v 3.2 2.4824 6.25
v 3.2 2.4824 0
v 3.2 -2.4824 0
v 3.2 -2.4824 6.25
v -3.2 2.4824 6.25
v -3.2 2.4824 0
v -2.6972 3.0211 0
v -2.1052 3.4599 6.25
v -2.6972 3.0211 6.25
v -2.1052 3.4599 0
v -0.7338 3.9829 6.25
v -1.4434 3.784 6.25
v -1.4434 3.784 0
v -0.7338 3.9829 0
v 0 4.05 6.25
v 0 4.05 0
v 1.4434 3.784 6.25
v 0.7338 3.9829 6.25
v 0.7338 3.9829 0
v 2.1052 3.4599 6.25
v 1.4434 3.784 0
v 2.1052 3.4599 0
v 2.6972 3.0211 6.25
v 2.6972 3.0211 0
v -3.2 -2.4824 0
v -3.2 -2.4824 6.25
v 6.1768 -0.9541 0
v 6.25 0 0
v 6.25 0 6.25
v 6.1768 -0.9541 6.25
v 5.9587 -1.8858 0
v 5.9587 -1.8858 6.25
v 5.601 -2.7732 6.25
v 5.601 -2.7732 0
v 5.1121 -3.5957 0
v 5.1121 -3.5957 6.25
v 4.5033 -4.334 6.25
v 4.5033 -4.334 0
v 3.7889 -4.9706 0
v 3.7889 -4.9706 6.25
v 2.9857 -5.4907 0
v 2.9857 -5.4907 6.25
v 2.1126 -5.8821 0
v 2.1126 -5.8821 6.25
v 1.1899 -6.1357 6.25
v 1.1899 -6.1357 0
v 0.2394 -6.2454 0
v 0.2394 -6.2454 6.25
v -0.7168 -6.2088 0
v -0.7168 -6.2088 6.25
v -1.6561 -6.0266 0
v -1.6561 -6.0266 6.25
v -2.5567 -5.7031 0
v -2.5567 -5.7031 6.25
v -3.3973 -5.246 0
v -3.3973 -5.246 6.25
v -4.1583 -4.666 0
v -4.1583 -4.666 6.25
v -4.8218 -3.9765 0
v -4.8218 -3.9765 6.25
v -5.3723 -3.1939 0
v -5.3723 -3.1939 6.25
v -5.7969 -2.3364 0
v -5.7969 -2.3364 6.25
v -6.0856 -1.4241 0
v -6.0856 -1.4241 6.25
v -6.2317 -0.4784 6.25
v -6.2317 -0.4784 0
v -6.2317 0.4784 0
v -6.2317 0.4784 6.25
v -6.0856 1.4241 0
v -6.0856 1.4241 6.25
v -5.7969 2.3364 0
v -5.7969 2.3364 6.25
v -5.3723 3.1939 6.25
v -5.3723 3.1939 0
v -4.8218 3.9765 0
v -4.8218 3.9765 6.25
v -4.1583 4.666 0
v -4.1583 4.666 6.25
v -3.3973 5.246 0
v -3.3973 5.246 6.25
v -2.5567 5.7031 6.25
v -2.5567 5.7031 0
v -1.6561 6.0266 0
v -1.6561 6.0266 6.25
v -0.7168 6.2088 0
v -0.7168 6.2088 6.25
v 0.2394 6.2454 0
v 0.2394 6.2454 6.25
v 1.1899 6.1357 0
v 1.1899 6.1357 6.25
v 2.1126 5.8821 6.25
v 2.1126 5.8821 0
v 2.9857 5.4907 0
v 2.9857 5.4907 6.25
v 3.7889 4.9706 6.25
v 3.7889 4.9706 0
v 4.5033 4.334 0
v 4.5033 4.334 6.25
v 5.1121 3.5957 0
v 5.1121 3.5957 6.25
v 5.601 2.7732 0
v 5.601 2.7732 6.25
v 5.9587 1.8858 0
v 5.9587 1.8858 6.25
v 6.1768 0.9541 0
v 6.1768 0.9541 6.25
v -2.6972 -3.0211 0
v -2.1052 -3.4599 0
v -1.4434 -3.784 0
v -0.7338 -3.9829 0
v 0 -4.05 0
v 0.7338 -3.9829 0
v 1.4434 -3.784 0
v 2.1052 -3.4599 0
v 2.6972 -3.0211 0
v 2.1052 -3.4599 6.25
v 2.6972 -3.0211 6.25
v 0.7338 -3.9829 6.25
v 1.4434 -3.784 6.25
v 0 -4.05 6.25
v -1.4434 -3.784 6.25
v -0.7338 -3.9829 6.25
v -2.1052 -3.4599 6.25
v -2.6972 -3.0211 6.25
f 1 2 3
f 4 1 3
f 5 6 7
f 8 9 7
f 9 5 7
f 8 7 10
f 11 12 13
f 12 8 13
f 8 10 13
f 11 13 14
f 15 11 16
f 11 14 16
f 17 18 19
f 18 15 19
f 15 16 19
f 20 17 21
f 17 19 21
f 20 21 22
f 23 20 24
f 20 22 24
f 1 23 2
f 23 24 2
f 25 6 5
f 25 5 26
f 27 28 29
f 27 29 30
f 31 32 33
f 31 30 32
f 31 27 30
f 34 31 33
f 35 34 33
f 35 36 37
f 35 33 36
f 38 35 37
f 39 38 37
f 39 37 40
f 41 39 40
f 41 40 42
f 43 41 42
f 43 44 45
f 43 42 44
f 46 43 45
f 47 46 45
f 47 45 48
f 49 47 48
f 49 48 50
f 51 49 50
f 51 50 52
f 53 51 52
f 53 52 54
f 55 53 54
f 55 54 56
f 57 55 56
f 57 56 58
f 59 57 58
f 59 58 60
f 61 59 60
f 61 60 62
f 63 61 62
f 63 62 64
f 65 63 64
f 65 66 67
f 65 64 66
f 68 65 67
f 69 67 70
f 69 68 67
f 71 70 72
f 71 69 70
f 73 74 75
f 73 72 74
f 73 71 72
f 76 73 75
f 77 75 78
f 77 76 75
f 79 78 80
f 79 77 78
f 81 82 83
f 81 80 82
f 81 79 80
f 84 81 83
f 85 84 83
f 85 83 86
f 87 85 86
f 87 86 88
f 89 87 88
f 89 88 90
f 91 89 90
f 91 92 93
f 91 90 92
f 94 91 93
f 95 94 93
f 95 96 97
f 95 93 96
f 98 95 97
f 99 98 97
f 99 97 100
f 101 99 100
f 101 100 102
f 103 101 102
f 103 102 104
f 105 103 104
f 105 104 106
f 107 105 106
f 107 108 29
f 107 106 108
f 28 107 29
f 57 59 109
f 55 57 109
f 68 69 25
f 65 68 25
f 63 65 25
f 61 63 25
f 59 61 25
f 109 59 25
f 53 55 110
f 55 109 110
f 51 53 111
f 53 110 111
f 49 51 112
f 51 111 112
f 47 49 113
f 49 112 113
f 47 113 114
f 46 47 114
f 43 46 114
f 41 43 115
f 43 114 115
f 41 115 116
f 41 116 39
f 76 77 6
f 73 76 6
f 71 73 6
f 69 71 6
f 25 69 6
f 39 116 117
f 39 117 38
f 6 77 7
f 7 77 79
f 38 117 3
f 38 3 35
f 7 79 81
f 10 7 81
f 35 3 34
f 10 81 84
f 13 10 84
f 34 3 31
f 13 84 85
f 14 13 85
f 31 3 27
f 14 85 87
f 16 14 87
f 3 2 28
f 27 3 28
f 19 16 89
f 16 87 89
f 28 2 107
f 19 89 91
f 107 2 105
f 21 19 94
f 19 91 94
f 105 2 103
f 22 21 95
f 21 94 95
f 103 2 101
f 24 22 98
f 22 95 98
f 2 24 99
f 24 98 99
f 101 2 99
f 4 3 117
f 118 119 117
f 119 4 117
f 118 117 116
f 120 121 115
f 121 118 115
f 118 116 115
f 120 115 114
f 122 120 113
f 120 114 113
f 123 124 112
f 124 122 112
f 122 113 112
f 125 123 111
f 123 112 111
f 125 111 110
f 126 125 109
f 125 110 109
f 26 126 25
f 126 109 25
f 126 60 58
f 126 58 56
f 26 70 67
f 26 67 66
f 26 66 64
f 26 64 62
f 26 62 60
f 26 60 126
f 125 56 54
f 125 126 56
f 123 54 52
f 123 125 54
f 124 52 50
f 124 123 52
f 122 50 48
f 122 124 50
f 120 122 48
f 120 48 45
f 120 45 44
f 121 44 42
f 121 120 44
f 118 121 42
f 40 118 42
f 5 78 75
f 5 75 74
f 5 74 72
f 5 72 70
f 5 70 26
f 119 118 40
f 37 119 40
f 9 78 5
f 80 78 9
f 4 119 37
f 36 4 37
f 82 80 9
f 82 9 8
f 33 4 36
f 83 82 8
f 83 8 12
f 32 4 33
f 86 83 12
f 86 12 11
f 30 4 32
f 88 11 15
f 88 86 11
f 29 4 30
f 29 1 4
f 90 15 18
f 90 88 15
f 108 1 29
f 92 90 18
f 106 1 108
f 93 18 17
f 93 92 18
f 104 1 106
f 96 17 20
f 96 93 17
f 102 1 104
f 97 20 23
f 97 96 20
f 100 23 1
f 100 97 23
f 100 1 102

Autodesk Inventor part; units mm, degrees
ref_plane "YZ Plane" through (0, 0, 0) normal (1, 0, 0) x (0, 1, 0)
ref_plane "XZ Plane" through (0, 0, 0) normal (0, 1, 0) x (-1, 0, 0)
ref_plane "XY Plane" through (0, 0, 0) normal (0, 0, 1) x (1, 0, 0)
sketch "Sketch1" plane through (0, 0, 0) normal (0, 0, 1) x (1, 0, 0)
  circle A0 centre (0, 0) radius 6.25
  line L0 (-3.2, 2.4824) -> (-3.2, -2.4824)
  line L1 (3.2, 2.4824) -> (3.2, -2.4824)
  arc A1 (3.2, 2.4824) -> (-3.2, 2.4824) centre (0, 0) ccw
  arc A2 (-3.2, -2.4824) -> (3.2, -2.4824) centre (0, 0) ccw
  dimension "d0" = 12.5
  dimension "d2" = 6.4
  dimension "d3" = 4.05
extrude "Extrusion1" add sketch "Sketch1" along normal blind 6.25
properties part number "308-05" material "Polypropylene"
